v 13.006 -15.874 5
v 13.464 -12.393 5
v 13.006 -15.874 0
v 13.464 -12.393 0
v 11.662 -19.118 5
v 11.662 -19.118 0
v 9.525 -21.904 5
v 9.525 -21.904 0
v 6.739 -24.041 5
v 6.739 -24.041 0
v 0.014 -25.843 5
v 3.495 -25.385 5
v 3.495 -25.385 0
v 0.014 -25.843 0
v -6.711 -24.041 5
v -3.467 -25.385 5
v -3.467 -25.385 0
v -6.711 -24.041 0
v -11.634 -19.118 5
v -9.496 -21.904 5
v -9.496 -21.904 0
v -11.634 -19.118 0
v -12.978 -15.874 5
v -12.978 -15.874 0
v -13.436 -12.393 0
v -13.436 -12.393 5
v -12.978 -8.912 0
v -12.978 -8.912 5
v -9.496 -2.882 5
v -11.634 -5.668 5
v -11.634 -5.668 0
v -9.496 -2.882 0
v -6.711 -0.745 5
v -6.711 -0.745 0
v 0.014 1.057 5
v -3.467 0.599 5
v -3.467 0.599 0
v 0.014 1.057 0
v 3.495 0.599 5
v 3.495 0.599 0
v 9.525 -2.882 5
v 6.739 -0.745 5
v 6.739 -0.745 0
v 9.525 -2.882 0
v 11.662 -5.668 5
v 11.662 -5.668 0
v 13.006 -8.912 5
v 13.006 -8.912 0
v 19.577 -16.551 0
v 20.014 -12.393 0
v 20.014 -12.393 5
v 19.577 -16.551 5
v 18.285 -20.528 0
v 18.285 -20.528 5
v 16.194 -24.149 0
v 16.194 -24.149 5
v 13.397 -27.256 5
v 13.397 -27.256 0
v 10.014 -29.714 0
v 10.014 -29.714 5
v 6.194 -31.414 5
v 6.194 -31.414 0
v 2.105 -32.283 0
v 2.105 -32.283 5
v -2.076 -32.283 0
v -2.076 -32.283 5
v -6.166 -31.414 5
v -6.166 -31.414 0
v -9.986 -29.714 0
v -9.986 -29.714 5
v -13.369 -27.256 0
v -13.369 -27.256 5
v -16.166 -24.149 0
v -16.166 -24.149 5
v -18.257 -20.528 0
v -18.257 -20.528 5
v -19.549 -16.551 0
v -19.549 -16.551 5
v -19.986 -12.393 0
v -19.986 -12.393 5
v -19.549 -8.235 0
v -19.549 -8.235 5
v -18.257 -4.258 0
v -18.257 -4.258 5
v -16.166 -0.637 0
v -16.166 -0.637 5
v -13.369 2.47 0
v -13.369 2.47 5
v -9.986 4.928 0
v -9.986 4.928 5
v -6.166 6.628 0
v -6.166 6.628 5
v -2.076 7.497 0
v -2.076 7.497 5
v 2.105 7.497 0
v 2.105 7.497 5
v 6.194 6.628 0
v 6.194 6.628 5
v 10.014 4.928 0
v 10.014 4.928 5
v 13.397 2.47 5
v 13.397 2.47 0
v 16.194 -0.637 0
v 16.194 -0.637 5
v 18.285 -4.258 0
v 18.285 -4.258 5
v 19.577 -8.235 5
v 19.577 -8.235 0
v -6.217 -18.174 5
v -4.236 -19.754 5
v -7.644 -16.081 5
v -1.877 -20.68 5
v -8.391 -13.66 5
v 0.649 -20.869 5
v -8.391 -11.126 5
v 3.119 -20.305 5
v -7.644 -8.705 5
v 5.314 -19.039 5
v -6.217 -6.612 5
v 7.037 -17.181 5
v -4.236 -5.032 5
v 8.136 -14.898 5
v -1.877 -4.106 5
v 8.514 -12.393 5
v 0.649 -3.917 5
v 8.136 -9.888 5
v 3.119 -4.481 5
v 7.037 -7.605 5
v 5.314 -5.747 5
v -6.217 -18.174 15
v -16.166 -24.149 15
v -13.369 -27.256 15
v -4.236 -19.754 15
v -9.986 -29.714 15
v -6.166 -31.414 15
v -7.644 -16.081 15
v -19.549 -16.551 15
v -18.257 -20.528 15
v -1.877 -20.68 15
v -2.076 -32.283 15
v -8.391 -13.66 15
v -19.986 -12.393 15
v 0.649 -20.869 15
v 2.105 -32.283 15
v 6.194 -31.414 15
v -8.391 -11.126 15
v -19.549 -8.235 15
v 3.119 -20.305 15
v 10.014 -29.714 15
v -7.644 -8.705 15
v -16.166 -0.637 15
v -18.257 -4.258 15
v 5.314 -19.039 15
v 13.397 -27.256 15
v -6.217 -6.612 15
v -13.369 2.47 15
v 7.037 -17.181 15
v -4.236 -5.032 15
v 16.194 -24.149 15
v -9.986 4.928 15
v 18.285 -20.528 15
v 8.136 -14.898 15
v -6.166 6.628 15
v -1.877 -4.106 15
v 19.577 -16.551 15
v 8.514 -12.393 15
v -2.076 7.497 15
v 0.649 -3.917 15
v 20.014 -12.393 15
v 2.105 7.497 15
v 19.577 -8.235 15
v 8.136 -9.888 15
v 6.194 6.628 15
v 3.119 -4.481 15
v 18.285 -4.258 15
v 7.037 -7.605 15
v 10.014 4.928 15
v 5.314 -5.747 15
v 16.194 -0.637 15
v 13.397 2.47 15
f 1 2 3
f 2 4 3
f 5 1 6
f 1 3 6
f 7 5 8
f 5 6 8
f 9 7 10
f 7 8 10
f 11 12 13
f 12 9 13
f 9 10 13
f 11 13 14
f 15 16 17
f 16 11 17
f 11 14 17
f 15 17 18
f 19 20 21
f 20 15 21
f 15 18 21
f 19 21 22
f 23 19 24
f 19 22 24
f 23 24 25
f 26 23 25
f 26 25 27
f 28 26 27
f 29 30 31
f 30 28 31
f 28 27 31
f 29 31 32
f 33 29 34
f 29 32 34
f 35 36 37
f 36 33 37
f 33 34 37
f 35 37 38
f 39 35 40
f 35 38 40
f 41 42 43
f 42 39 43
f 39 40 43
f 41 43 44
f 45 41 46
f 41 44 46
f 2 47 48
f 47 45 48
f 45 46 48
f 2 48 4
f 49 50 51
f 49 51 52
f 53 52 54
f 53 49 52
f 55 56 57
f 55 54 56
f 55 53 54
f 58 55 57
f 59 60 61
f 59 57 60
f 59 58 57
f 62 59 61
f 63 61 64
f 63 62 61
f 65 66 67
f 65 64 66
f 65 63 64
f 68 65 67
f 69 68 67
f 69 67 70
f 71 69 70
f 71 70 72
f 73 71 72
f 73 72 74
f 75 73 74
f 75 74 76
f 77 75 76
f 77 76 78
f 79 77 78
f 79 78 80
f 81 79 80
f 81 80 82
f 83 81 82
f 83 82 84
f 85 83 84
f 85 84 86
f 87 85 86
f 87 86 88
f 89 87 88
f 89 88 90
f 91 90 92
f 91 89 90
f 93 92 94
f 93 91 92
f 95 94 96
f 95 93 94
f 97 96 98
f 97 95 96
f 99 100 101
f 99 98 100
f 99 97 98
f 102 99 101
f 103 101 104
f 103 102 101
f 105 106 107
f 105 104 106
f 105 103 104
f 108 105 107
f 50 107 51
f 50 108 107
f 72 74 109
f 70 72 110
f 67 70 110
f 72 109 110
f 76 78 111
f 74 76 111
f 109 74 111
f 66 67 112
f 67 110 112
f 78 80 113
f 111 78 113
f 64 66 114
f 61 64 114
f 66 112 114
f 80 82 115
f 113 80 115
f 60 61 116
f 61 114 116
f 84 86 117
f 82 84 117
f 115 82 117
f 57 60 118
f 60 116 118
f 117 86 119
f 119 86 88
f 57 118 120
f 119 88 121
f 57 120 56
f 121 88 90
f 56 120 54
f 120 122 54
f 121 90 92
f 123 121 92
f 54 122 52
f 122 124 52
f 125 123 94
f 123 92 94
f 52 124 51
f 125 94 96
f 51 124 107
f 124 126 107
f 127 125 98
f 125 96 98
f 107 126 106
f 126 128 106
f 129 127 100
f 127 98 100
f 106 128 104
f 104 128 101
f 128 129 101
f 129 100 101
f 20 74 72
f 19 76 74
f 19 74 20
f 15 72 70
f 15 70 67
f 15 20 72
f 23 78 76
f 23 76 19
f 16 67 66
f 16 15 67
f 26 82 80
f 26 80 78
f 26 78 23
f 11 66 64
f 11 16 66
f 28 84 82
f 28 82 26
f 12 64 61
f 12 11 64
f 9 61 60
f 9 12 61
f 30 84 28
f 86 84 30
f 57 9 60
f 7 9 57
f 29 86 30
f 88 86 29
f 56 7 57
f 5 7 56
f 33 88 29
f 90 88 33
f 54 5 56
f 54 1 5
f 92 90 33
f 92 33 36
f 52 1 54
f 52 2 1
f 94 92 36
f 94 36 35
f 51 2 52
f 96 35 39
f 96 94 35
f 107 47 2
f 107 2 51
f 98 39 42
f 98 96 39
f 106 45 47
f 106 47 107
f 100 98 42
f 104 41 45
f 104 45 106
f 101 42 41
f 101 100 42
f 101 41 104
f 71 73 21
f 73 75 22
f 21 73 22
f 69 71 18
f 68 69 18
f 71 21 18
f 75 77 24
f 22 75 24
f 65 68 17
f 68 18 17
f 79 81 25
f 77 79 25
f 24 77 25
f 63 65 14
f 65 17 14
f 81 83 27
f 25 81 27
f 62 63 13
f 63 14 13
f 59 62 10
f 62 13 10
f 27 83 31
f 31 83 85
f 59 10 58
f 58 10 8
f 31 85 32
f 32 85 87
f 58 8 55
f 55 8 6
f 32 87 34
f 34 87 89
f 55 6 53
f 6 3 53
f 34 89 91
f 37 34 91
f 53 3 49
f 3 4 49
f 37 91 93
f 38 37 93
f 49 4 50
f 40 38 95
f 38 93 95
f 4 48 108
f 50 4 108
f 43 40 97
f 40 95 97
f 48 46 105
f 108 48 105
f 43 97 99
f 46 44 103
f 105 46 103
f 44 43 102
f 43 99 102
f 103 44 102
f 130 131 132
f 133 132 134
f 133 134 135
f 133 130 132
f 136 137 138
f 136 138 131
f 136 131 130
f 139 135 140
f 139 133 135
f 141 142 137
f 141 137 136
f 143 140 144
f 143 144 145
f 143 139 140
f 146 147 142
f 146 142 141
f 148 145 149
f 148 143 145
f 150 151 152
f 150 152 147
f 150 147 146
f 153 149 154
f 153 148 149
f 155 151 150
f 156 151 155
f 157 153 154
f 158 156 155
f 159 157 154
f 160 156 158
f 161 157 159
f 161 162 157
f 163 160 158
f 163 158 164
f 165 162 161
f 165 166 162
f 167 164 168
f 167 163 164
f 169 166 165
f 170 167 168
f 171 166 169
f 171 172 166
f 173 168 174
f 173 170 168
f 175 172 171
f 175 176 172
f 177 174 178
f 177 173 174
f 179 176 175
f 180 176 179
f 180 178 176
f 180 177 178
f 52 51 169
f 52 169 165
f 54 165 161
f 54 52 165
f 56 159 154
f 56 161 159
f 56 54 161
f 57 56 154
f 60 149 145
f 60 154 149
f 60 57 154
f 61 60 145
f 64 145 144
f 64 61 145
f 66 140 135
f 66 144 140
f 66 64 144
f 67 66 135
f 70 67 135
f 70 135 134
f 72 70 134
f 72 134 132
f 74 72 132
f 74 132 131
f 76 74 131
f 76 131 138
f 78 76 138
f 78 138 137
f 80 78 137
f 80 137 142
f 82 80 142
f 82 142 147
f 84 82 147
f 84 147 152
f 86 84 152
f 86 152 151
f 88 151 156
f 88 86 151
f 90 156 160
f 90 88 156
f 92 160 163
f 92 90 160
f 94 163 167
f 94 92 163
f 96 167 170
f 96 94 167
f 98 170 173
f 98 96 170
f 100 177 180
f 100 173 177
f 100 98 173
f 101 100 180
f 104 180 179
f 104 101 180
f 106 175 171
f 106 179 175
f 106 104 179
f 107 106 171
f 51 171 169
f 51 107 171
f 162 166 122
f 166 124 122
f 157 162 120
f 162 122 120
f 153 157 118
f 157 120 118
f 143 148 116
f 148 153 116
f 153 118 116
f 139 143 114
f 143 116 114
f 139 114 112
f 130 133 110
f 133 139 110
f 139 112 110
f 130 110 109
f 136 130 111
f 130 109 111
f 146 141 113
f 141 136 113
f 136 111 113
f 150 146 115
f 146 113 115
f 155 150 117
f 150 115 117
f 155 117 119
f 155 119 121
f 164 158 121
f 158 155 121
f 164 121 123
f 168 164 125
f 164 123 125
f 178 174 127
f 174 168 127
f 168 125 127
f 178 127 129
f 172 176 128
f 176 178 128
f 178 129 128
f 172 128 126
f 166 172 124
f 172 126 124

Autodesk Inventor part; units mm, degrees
ref_plane "YZ Plane" through (0, 0, 0) normal (1, 0, 0) x (0, 1, 0)
ref_plane "XZ Plane" through (0, 0, 0) normal (0, 1, 0) x (-1, 0, 0)
ref_plane "XY Plane" through (0, 0, 0) normal (0, 0, 1) x (1, 0, 0)
sketch "Эскиз1" plane through (0, 0, 0) normal (0, 0, 1) x (1, 0, 0)
  circle A0 centre (0.0141, -12.393) radius 20
  circle A1 centre (0.0141, -12.393) radius 13.45
  point P0 (0, 0)
  dimension "d0" = 40
  dimension "d1" = 26.9
extrude "Выдавливание1" add sketch "Эскиз1" along normal blind 5
sketch "Эскиз2" plane through (0.0141, -12.393, 5) normal (0, 0, 1) x (1, 0, 0)
  circle A0 centre (0, 0) radius 20
  circle A1 centre (0, 0) radius 8.5
  point P0 (-0.0141, 12.393)
  dimension "d4" = 17
extrude "Выдавливание2" add sketch "Эскиз2" along normal blind 10 separate body
properties part number "Гор. шарн. - проставка 1"
